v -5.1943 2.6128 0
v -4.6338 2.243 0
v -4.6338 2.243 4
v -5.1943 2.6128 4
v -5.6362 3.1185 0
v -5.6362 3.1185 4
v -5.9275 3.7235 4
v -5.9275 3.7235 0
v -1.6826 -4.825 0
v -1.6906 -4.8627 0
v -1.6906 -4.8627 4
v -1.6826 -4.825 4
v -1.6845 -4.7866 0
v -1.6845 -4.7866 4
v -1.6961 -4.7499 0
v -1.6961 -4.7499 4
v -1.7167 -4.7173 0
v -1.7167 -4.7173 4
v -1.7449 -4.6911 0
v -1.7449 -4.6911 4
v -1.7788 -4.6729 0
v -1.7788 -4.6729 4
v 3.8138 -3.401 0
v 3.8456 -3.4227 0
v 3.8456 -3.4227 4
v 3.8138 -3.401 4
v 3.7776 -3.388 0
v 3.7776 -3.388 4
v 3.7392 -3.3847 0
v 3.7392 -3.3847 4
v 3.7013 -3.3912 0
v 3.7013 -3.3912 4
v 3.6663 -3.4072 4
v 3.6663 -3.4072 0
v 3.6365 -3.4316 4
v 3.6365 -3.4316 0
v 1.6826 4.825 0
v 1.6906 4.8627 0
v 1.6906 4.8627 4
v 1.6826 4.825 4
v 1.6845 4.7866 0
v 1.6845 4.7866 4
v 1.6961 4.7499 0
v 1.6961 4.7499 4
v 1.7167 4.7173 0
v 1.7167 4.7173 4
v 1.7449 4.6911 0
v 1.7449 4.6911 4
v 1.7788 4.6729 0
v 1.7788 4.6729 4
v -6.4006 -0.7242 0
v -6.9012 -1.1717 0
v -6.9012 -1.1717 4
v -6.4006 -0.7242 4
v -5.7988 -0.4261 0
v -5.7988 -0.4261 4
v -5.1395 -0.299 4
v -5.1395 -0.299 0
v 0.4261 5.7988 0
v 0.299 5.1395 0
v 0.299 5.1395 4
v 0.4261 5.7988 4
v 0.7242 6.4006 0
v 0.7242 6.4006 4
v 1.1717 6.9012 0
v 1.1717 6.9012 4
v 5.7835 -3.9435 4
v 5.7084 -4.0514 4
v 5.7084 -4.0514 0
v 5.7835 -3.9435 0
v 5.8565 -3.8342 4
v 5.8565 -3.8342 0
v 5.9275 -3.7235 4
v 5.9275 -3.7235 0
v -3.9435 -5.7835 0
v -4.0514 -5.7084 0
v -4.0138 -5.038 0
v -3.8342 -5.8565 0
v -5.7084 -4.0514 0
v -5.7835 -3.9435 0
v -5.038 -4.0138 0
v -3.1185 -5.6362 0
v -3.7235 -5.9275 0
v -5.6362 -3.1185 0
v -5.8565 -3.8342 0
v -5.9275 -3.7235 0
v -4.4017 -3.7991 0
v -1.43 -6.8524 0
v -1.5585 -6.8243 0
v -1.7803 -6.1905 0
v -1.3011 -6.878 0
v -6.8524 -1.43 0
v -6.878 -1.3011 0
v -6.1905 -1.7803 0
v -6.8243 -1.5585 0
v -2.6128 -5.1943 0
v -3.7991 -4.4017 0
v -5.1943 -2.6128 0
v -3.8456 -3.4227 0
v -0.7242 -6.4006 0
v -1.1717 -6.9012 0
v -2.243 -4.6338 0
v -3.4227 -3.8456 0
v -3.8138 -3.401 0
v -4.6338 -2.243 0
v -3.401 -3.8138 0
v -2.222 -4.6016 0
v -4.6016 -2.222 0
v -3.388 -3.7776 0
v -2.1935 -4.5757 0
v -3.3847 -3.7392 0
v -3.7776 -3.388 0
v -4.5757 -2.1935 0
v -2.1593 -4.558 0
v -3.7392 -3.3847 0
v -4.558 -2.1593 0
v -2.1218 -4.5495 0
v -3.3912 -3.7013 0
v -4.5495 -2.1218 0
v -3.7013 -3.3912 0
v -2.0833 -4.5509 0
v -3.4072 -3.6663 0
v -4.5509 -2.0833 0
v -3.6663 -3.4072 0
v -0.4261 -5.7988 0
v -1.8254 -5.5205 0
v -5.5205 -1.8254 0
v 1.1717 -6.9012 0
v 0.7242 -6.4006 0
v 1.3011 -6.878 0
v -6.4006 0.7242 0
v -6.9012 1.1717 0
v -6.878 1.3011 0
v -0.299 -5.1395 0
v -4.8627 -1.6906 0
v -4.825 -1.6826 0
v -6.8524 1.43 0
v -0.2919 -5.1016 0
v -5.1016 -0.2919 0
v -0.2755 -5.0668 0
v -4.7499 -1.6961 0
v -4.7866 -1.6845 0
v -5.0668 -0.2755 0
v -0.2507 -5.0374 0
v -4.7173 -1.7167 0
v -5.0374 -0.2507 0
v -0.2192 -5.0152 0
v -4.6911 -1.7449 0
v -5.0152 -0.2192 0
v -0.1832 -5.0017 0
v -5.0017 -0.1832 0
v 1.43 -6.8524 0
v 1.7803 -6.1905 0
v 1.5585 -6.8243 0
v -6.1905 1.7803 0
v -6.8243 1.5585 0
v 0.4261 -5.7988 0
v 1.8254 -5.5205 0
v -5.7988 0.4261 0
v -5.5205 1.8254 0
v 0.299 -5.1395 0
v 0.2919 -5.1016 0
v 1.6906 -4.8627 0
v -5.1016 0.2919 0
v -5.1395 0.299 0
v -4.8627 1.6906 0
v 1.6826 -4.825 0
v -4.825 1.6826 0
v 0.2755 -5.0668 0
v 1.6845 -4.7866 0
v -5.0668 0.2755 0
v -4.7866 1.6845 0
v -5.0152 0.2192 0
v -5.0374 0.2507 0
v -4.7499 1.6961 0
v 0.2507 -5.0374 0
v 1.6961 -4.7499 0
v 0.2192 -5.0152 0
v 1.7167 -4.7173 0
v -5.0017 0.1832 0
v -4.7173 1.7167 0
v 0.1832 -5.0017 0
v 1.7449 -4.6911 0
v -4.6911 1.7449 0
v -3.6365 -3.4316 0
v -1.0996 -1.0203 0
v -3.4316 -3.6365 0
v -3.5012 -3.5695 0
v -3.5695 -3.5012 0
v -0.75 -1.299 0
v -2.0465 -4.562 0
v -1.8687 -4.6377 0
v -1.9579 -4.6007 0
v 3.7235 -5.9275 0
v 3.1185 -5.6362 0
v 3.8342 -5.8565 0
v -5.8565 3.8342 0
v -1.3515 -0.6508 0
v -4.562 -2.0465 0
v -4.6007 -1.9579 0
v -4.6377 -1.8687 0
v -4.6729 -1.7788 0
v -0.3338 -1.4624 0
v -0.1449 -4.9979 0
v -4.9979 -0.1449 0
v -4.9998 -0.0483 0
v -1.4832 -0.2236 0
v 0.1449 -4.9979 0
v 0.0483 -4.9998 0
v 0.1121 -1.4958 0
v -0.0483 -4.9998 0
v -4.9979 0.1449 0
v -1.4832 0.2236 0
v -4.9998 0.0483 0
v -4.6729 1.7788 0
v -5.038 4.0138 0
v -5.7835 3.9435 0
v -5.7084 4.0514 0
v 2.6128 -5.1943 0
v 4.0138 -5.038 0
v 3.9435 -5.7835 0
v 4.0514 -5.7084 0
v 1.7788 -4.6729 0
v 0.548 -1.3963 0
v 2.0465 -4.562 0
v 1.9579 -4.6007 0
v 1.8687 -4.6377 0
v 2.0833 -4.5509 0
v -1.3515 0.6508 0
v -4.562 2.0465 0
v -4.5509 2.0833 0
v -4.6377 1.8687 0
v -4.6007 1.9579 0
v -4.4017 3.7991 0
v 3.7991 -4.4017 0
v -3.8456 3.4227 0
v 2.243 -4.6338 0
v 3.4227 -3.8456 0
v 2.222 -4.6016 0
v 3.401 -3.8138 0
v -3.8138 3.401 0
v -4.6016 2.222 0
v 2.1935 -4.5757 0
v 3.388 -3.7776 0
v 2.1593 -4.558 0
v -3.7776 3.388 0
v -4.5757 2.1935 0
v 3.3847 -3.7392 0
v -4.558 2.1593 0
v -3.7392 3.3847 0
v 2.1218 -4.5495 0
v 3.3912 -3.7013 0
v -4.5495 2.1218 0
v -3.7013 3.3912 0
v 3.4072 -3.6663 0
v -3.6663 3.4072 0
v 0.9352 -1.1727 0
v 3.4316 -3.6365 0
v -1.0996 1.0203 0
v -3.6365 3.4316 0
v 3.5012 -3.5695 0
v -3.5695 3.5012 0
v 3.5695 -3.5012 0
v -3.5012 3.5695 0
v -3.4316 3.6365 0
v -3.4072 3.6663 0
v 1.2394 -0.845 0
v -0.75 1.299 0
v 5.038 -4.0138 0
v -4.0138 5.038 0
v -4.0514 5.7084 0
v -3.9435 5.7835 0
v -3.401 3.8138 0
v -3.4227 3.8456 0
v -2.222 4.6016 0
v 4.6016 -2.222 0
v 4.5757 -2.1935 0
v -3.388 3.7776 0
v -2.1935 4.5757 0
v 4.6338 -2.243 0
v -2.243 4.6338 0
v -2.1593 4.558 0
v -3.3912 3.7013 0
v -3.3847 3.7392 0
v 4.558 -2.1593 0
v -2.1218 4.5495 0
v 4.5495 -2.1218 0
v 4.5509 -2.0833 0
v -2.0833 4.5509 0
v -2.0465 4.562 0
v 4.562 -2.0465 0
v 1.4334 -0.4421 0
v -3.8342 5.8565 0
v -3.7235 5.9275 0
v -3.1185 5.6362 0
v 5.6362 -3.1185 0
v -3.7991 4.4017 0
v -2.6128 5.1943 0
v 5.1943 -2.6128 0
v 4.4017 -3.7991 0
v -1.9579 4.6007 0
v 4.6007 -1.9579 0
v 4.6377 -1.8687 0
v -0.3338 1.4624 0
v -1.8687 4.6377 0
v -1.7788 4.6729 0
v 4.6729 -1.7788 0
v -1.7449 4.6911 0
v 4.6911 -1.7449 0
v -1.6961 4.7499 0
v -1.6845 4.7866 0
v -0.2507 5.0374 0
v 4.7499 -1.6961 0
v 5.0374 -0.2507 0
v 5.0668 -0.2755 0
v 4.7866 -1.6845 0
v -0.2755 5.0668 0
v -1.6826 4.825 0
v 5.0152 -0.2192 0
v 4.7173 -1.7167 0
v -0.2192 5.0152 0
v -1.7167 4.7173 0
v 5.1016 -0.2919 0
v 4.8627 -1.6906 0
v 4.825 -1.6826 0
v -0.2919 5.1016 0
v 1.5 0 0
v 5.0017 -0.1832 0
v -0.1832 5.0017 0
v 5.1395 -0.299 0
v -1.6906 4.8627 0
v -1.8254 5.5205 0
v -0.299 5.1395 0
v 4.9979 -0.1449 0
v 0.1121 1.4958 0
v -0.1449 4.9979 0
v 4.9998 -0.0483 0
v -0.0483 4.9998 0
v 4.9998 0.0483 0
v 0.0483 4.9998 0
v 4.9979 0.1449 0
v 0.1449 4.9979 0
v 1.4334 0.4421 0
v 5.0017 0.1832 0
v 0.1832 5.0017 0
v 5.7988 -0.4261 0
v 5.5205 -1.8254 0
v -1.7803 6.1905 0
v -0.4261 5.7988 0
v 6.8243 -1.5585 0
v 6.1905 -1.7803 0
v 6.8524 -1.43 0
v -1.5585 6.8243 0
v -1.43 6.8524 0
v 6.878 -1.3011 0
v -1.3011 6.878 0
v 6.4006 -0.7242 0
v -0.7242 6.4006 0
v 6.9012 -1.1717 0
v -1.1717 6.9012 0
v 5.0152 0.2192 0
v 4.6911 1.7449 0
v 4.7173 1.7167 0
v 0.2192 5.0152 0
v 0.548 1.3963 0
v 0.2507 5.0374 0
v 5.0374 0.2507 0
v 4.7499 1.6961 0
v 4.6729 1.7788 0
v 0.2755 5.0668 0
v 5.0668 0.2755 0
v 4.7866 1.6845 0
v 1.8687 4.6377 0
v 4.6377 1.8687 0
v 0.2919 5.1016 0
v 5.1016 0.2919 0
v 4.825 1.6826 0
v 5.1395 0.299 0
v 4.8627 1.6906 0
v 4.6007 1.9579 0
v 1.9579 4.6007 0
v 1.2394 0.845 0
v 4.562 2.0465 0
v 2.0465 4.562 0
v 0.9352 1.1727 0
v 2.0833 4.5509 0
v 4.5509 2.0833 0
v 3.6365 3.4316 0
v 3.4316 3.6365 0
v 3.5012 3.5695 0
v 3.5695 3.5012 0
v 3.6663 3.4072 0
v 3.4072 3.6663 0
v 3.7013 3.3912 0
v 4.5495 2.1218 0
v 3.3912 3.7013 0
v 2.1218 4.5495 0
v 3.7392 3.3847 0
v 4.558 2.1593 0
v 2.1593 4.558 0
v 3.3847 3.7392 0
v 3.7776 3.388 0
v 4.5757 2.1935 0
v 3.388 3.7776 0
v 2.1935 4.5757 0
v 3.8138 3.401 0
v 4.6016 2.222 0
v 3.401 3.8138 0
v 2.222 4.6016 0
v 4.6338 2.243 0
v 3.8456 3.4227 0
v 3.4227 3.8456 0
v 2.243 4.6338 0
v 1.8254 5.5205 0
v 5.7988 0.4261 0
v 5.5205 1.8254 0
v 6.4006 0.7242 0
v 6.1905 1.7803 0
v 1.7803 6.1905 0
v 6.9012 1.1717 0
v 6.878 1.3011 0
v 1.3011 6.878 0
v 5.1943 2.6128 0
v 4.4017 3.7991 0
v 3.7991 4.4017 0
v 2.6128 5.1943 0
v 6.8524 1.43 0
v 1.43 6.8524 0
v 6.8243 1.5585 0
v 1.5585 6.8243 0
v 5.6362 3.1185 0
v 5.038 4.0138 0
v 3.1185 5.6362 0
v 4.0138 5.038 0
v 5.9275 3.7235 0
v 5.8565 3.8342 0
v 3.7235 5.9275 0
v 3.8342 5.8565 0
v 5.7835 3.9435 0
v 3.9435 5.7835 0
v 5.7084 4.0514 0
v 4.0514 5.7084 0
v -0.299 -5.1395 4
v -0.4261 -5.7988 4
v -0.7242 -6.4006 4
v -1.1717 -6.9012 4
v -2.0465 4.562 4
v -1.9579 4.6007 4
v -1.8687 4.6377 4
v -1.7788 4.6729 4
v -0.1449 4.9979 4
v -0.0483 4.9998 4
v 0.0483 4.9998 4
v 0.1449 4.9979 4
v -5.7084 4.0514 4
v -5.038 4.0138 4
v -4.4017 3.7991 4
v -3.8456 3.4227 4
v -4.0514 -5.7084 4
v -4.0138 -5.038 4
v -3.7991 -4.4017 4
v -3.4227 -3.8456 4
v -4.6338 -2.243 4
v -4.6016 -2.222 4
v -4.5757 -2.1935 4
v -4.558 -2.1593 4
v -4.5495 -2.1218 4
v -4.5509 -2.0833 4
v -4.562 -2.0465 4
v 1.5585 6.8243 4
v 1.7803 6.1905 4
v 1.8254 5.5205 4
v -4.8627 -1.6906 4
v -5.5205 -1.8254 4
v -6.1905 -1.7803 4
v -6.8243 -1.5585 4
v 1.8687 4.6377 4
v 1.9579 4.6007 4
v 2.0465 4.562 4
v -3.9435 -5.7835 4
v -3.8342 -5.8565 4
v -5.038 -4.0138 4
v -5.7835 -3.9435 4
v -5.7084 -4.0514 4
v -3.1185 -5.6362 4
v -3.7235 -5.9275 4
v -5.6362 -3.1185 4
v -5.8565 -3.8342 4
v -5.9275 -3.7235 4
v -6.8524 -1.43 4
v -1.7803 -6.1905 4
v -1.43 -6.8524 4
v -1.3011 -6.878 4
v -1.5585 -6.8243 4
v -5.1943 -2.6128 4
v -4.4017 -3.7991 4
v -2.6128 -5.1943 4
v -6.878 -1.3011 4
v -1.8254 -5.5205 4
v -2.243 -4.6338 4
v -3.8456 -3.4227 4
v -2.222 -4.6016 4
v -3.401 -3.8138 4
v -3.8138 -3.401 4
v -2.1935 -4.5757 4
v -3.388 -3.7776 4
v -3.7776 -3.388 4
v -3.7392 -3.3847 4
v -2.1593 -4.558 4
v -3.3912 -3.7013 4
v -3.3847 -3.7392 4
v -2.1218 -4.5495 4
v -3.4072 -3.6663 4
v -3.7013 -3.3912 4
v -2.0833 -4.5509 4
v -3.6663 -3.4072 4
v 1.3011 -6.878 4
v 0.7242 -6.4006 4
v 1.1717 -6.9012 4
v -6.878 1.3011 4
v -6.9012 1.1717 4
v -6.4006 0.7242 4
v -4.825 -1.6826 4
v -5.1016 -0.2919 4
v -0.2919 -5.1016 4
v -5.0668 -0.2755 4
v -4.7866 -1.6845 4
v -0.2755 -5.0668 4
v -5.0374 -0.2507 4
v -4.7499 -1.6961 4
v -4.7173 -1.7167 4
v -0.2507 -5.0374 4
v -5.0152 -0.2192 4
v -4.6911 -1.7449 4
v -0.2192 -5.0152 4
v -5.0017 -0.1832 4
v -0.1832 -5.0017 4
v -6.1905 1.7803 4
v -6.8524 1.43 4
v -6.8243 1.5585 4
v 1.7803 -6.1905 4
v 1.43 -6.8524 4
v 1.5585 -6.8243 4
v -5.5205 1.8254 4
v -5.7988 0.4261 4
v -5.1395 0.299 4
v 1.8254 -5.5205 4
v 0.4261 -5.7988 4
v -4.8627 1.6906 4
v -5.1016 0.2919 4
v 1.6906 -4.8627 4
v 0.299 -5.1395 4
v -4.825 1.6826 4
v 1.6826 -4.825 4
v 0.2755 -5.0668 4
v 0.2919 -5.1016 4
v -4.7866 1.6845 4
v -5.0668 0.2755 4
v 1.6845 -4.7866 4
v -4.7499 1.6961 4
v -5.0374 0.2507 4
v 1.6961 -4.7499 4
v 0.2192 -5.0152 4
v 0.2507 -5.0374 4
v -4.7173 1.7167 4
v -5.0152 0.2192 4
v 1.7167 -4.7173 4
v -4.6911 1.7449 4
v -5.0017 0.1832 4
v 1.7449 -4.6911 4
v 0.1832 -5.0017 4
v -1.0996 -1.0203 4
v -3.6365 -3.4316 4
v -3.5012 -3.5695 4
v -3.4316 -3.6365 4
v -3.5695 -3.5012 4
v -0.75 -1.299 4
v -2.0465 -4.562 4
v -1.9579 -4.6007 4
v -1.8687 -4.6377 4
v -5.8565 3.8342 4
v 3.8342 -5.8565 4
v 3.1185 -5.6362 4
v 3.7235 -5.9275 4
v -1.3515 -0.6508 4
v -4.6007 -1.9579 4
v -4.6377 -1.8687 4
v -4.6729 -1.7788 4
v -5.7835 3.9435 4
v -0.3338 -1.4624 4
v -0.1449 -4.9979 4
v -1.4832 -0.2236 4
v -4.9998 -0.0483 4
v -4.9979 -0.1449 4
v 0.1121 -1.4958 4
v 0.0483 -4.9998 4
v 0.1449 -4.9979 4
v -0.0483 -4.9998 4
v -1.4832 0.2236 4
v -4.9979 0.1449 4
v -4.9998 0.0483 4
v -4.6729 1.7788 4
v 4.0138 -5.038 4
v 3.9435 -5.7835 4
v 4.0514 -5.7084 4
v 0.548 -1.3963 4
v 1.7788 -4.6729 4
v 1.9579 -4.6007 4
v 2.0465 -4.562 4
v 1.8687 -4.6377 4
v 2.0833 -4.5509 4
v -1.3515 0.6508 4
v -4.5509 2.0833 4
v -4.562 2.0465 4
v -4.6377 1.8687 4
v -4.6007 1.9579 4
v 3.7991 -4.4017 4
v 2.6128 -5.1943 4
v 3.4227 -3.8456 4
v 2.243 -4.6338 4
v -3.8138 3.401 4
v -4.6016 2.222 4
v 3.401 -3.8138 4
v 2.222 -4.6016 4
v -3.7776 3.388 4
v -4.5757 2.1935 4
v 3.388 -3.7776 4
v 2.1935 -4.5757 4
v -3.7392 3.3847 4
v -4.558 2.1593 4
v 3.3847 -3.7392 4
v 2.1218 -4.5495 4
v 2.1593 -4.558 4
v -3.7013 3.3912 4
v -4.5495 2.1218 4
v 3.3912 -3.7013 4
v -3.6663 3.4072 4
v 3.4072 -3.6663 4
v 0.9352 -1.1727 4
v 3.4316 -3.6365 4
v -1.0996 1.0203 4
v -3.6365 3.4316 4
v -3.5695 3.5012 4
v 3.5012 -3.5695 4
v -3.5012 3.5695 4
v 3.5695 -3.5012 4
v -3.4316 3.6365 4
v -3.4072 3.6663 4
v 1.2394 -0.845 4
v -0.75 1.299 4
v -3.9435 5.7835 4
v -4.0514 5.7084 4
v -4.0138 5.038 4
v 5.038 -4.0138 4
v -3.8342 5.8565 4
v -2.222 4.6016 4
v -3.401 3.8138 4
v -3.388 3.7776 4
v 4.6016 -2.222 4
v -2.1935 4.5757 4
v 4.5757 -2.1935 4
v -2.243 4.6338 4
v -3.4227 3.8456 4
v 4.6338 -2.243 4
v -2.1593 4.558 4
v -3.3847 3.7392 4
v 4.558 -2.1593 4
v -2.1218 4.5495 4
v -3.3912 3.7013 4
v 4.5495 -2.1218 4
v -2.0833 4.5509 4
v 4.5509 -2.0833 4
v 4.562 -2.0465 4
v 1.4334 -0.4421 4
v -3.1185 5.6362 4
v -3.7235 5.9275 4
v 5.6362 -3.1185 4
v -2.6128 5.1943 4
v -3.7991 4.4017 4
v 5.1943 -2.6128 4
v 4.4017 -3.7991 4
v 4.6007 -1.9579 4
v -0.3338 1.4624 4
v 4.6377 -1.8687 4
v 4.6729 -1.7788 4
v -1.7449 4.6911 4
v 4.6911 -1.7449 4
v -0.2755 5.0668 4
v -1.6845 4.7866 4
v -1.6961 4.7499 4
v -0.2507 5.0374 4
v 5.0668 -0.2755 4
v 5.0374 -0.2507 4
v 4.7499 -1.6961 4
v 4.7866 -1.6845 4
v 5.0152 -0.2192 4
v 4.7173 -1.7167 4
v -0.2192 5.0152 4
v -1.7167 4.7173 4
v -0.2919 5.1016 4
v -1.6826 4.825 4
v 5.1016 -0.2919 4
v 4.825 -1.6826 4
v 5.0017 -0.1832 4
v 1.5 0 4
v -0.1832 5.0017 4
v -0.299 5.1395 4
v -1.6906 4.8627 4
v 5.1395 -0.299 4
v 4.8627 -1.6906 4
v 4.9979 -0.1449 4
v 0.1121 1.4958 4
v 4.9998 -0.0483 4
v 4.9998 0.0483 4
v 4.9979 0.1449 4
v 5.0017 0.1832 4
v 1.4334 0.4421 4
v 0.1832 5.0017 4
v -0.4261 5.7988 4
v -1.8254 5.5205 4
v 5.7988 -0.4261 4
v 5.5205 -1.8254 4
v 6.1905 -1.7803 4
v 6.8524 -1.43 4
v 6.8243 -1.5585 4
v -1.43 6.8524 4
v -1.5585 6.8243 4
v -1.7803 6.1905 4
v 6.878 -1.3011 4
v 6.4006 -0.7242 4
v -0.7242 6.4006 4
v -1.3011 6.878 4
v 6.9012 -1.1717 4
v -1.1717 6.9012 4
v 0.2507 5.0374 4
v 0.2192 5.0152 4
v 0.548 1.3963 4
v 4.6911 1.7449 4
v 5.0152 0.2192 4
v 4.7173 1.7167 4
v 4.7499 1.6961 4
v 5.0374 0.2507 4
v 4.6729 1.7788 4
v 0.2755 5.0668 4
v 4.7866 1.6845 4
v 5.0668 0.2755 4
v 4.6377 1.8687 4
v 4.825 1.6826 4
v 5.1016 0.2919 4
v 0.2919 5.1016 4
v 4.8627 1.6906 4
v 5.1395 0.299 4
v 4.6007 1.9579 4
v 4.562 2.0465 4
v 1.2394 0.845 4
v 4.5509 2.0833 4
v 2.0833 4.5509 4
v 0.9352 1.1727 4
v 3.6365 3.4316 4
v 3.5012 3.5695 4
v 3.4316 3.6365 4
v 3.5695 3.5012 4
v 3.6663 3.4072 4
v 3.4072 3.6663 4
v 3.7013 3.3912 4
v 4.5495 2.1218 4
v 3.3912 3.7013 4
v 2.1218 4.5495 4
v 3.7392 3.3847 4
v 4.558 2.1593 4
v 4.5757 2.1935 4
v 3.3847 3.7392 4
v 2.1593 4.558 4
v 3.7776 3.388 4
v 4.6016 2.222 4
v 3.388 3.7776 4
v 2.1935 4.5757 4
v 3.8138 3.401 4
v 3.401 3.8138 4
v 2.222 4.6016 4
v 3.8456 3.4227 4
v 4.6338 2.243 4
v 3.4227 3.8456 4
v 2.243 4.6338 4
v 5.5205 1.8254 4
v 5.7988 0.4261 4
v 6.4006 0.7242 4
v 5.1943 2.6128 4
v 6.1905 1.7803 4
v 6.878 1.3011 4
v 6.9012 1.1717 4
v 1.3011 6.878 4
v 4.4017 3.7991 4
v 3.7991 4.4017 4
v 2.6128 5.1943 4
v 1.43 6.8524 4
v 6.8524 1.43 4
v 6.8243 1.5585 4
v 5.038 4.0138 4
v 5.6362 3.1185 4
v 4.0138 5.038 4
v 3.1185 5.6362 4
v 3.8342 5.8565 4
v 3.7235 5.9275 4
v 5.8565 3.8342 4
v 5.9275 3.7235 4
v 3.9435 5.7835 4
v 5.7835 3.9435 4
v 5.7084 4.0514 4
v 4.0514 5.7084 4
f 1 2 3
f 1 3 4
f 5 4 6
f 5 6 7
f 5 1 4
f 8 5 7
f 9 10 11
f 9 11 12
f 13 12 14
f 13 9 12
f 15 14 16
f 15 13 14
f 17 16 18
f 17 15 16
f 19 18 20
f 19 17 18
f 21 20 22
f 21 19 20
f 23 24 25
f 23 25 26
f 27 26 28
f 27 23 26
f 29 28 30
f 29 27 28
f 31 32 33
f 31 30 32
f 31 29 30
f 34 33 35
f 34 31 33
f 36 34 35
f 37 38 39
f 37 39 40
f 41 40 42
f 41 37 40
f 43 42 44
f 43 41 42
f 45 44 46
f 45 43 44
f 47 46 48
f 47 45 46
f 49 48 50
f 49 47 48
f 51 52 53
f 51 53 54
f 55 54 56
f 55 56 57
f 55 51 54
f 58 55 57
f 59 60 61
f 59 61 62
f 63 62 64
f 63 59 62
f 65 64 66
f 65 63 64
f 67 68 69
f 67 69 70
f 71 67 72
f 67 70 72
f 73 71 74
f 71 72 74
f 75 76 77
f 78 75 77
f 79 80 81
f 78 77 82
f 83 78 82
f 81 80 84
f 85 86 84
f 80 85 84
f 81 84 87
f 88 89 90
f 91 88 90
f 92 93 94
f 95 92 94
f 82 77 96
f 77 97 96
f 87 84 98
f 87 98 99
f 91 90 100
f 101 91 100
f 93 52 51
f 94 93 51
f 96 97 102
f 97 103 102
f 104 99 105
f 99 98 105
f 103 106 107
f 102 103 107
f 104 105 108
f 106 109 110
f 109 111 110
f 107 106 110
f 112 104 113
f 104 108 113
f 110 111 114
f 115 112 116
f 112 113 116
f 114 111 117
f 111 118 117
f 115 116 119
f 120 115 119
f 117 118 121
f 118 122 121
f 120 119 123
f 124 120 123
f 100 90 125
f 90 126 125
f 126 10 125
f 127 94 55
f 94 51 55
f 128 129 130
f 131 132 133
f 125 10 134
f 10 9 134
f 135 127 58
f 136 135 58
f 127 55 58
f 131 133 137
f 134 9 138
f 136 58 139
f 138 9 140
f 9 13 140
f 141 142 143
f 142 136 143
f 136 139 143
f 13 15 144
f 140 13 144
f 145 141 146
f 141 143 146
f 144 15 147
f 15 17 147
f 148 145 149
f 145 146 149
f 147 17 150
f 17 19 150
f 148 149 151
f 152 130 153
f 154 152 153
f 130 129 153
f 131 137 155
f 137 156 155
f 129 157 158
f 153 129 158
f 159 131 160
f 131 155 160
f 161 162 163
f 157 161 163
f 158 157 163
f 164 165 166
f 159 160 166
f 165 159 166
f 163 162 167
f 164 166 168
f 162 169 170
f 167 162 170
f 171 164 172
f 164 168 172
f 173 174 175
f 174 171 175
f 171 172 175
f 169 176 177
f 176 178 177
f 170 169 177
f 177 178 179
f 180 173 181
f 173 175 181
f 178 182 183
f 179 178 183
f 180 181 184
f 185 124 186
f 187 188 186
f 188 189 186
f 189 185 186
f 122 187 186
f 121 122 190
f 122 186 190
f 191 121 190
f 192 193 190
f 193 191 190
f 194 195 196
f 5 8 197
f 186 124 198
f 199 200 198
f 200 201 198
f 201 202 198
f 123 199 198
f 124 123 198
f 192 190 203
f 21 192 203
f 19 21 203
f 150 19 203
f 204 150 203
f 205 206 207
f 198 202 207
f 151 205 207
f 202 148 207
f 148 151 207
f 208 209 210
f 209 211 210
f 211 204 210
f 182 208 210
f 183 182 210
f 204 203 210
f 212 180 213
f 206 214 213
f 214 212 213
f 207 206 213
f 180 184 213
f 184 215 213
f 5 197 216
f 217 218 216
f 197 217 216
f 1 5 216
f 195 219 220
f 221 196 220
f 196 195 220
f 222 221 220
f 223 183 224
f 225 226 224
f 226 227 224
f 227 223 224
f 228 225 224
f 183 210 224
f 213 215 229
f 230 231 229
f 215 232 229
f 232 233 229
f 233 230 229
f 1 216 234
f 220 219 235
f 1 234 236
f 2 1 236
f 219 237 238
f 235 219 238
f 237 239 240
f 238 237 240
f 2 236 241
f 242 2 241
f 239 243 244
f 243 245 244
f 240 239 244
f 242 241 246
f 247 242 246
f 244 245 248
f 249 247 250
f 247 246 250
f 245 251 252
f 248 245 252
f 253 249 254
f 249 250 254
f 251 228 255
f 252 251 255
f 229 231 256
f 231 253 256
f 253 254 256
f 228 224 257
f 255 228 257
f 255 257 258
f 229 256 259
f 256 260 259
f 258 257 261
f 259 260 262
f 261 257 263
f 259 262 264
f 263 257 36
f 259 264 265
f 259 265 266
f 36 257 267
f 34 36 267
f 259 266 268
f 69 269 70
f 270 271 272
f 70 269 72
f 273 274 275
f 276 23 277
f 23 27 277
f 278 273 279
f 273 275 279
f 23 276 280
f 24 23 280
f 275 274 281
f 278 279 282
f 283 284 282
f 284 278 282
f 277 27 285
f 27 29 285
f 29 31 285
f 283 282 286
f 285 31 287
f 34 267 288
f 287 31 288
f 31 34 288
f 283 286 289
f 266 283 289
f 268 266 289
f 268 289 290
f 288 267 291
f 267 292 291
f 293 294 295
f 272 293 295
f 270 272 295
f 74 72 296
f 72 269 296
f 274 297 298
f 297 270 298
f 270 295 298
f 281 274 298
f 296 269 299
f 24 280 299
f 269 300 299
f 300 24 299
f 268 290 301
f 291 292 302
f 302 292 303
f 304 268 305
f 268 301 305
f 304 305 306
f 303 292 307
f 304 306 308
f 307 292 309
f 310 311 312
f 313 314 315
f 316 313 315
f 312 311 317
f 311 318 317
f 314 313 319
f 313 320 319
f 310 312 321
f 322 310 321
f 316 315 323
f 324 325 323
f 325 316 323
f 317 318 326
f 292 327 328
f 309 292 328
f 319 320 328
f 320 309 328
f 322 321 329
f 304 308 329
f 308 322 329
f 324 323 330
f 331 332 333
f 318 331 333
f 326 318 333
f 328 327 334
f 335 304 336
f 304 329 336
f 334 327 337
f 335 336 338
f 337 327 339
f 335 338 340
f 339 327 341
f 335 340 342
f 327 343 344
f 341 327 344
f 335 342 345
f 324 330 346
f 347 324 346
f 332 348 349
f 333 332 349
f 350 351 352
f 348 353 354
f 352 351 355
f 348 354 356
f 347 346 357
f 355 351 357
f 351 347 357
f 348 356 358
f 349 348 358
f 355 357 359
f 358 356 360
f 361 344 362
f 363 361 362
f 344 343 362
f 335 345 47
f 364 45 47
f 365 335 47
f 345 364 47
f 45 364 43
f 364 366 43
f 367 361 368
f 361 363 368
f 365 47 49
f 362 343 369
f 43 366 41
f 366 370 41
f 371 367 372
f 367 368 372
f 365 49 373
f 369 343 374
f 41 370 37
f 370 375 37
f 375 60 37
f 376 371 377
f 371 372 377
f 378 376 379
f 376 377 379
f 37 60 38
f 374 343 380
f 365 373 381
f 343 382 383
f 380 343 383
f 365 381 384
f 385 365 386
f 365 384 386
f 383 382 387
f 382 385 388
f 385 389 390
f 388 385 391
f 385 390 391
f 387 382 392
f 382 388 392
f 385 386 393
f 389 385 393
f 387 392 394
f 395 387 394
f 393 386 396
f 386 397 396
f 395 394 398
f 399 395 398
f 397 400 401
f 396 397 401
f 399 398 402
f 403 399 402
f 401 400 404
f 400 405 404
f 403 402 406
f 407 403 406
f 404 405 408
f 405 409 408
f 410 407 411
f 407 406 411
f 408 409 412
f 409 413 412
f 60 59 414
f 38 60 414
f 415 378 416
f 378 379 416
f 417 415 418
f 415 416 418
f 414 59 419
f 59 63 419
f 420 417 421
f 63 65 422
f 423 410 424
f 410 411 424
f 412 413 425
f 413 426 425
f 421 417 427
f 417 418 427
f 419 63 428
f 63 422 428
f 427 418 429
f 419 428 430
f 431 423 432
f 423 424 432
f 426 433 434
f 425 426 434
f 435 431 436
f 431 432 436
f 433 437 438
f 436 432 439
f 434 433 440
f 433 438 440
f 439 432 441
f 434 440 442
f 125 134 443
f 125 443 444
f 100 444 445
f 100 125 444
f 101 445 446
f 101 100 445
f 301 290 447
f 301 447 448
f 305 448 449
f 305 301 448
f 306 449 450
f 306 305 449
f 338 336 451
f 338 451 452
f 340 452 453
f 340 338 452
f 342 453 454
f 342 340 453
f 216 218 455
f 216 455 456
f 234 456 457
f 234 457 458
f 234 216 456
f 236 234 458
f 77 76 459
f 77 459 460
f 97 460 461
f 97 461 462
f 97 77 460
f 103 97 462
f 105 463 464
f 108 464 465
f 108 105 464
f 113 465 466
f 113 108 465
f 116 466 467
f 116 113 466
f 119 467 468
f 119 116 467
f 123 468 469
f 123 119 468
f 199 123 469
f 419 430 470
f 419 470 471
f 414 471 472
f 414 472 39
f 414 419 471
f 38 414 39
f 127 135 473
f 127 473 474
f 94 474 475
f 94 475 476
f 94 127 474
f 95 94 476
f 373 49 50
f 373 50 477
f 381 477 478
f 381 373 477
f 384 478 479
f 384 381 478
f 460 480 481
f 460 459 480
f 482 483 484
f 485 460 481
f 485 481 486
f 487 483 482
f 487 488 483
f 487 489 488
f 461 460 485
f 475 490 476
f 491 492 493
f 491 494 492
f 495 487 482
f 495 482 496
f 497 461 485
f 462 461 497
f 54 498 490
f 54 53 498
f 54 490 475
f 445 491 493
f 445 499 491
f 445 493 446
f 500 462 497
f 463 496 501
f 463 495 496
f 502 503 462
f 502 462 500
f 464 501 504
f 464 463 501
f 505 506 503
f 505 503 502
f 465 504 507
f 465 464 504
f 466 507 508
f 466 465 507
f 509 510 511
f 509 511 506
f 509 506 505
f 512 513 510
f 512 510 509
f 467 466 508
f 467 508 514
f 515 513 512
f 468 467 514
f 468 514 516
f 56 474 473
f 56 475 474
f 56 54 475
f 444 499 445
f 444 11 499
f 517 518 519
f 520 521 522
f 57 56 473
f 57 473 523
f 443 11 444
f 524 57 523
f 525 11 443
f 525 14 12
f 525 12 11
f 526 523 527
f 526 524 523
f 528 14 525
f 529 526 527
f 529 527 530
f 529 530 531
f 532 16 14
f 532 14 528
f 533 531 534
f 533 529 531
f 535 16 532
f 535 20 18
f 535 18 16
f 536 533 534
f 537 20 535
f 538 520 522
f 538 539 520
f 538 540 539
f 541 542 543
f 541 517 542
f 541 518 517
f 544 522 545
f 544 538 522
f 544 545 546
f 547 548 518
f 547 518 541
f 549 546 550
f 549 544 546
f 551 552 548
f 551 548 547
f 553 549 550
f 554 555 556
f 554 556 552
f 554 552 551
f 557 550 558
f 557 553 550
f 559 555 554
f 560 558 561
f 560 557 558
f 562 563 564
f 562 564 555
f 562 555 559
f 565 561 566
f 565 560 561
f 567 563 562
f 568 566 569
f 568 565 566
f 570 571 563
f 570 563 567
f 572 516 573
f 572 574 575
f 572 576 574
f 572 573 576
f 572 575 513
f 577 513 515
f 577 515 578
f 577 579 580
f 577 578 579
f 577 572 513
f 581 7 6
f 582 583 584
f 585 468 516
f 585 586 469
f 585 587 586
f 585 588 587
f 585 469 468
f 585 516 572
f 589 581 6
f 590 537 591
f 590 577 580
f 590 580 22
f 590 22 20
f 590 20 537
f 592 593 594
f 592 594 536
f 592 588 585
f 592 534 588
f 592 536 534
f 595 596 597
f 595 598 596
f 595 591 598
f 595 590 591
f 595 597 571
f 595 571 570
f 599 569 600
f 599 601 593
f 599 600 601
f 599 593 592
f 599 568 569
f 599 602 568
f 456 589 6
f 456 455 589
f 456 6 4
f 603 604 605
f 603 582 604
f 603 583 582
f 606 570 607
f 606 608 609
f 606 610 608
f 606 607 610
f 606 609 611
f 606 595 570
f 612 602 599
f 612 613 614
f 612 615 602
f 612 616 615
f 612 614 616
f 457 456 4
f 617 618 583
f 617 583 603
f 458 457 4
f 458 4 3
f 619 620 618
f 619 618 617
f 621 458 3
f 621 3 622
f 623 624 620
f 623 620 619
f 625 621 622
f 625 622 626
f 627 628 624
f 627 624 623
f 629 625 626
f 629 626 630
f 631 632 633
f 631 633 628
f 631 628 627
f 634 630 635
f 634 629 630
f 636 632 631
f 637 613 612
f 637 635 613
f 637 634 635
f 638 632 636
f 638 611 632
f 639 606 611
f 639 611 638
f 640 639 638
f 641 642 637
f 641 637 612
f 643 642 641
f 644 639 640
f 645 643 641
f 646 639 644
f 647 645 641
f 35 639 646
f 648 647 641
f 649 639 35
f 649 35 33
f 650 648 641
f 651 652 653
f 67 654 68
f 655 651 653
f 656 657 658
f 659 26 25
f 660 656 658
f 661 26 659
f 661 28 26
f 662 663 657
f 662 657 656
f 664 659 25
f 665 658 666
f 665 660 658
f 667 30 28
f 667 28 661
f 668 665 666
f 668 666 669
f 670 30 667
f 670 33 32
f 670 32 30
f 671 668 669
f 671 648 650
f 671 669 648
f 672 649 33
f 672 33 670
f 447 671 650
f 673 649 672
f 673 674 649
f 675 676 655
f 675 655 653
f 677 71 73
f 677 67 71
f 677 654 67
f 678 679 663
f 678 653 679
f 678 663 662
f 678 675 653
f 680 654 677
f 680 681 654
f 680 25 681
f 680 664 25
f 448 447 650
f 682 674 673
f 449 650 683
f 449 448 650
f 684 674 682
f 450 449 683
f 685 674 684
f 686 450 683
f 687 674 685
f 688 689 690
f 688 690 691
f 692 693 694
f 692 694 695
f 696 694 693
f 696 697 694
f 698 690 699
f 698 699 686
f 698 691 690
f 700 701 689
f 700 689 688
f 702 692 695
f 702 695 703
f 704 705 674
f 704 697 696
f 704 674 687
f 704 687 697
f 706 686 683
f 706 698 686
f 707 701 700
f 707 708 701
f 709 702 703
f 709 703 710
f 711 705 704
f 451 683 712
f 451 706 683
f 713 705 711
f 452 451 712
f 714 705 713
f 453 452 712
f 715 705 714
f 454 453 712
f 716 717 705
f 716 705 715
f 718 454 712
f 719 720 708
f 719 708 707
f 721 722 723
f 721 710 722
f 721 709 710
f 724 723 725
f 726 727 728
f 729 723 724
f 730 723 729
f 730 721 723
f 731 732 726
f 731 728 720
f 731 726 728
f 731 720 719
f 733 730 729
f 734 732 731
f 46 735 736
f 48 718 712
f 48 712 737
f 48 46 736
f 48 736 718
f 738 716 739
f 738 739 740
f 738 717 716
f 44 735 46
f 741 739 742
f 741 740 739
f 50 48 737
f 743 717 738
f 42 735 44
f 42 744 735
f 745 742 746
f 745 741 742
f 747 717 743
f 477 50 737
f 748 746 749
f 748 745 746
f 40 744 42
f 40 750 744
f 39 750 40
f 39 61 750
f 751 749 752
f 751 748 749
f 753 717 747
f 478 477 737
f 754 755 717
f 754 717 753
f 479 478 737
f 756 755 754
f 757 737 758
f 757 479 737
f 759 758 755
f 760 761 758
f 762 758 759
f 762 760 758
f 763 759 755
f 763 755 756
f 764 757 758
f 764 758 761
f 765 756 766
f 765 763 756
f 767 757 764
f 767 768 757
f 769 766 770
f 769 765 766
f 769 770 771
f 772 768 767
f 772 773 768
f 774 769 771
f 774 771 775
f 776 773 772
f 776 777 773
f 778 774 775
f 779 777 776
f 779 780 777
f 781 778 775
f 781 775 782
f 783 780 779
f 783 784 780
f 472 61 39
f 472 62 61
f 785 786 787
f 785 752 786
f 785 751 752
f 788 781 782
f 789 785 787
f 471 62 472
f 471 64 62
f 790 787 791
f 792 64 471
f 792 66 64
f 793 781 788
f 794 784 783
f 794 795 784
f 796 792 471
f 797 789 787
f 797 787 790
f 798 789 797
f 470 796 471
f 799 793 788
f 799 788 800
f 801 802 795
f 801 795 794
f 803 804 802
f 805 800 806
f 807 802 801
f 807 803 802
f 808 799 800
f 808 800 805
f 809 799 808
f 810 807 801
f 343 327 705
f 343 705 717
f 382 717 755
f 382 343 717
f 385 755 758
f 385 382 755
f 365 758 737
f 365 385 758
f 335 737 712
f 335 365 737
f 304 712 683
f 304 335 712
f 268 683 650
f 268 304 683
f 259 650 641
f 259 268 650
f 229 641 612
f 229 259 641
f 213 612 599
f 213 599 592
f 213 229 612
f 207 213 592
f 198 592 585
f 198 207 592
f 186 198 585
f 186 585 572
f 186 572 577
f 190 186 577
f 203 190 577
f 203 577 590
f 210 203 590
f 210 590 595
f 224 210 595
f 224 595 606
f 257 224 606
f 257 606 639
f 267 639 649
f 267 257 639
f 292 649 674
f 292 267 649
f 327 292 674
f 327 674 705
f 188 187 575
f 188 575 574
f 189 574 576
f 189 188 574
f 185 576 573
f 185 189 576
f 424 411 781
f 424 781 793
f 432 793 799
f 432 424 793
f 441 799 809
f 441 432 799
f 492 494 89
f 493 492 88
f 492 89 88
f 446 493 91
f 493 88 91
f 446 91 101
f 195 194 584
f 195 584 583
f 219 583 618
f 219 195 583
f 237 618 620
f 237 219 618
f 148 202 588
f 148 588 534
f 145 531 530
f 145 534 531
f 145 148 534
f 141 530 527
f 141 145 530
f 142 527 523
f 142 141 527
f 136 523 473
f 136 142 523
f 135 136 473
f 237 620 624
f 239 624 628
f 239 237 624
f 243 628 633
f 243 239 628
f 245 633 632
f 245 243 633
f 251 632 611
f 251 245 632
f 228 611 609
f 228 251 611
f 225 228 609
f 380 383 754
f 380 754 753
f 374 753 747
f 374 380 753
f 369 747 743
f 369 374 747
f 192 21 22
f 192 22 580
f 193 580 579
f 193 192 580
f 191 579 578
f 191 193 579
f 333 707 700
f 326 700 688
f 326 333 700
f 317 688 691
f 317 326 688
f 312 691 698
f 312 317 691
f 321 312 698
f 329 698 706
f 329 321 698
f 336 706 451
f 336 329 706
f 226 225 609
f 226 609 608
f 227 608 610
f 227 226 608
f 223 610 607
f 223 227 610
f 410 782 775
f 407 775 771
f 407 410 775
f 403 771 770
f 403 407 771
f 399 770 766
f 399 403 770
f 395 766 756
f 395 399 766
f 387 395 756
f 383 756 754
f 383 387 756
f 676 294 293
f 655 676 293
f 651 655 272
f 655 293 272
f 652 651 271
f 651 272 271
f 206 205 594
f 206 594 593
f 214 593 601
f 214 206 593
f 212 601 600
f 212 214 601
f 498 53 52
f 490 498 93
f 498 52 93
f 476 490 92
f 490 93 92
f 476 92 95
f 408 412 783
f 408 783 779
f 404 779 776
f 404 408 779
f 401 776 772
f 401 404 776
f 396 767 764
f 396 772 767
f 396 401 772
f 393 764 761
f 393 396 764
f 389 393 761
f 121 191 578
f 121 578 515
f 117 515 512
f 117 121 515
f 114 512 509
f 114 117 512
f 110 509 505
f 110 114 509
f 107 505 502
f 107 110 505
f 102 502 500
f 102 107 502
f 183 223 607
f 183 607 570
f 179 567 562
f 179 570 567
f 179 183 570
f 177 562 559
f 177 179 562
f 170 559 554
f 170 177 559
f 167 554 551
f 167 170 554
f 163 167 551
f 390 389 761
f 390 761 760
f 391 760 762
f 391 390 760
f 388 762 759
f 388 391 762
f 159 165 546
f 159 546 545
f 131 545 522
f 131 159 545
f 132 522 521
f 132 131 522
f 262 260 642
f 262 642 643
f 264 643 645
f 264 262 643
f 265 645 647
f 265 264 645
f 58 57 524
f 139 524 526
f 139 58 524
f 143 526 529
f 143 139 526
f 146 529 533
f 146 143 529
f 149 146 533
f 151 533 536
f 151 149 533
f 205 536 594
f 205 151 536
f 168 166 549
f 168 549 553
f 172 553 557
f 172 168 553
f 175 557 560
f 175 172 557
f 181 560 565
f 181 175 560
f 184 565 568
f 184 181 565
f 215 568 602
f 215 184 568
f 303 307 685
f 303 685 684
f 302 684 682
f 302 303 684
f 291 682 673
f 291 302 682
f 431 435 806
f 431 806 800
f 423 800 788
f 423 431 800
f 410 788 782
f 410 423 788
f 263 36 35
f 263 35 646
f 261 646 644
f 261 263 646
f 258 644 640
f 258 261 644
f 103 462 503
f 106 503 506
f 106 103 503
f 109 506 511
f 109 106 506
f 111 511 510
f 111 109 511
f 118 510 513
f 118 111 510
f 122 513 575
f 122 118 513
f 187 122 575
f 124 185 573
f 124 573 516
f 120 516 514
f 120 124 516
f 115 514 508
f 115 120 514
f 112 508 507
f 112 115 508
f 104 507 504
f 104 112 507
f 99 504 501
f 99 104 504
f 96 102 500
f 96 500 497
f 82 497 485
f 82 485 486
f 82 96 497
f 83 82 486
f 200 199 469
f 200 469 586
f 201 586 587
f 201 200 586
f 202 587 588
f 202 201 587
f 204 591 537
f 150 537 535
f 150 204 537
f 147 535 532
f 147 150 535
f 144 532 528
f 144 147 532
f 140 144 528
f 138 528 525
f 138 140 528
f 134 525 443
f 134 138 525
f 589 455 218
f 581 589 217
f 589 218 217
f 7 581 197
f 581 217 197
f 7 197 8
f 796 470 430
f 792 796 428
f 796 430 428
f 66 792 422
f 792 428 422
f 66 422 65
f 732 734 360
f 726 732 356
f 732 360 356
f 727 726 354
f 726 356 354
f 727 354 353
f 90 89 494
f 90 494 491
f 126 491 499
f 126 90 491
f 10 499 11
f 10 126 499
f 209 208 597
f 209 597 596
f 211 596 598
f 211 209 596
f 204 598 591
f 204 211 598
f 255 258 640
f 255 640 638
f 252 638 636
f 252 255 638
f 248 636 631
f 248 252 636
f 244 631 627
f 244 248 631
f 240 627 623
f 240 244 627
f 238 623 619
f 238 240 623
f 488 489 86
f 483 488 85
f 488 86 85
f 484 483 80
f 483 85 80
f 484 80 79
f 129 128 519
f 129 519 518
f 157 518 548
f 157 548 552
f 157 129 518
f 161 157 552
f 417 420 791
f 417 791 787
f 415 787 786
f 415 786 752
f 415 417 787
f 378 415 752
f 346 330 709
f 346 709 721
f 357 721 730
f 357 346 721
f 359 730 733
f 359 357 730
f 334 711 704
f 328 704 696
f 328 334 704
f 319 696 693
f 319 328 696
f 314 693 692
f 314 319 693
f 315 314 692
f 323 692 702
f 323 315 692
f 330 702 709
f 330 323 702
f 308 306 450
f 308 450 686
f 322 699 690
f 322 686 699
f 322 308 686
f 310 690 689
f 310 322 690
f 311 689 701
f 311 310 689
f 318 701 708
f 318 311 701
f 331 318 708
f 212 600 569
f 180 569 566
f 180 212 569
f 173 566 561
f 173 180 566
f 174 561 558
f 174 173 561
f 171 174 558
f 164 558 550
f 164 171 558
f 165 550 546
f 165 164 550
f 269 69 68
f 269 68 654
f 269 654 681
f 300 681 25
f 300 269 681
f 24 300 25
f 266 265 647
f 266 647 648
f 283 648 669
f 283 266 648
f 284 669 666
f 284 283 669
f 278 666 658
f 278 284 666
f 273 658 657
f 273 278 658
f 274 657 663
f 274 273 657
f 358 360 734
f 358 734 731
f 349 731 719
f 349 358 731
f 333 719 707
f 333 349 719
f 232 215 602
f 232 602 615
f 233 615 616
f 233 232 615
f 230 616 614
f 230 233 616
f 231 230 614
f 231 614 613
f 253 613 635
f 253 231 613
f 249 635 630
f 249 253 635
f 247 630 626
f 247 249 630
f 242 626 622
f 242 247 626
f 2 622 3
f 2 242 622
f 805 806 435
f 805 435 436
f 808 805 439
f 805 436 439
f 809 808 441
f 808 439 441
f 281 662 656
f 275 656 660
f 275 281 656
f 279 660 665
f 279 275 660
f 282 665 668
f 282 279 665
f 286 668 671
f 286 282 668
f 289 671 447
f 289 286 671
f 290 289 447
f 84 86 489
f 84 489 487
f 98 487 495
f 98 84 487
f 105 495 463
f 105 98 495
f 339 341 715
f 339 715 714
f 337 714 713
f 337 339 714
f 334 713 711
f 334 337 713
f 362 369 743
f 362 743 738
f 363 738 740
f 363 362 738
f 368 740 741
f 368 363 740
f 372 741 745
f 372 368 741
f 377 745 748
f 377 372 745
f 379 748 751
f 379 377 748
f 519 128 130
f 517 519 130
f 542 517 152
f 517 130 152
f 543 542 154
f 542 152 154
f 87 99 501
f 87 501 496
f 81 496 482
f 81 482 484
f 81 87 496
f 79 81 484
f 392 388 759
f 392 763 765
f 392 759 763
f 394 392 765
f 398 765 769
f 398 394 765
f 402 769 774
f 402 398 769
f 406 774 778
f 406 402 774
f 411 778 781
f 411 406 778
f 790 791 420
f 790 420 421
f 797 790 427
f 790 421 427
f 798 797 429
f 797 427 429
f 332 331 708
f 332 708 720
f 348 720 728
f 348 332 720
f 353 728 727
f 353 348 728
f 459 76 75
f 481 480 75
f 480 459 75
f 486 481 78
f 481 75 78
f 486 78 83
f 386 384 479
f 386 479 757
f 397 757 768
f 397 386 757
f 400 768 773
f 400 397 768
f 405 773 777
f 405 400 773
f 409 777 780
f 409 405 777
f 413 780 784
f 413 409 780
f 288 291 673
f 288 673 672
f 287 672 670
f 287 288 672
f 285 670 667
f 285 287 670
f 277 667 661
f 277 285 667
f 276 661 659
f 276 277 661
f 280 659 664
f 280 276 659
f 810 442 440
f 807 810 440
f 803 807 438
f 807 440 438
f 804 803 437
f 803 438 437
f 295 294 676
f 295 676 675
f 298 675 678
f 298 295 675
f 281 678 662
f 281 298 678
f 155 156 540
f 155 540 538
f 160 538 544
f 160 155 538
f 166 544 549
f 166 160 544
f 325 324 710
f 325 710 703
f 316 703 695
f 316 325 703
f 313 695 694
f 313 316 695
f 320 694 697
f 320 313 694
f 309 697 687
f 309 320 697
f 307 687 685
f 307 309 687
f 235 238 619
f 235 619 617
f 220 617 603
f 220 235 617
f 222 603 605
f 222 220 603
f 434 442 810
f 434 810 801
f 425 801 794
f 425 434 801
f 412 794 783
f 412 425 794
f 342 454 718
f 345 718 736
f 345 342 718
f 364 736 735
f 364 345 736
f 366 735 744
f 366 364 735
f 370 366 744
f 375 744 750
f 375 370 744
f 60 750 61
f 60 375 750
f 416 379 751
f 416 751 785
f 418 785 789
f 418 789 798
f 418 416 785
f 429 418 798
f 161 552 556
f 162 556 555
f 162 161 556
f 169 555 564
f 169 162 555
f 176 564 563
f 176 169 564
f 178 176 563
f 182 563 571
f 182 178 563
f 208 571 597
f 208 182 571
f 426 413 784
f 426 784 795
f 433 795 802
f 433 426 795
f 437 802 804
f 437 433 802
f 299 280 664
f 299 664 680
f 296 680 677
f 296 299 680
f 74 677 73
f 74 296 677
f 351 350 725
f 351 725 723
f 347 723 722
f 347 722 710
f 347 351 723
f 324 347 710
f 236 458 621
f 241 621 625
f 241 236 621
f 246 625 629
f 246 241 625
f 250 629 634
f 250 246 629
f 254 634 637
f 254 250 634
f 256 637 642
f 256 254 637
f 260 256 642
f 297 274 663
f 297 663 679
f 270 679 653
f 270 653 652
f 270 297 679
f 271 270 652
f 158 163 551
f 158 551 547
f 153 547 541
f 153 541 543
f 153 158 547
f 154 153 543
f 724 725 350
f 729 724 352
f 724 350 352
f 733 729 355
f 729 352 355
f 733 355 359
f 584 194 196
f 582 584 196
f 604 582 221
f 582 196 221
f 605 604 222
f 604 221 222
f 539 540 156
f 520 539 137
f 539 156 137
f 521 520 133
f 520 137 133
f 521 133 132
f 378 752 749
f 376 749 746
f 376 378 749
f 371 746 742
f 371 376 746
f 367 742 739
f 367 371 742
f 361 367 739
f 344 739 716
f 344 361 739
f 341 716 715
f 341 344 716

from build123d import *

# Parameters (mm, degrees)
SKETCH1_R           = 7
SKETCH1_R_2         = 1.5
BOSS_EXTRUDE1_DEPTH = 4
CUT_EXTRUDE2_DEPTH  = 5
CIRPATTERN2_COUNT   = 16


with BuildPart() as part:
    # Sketch1 → Boss-Extrude1 (new body)
    with BuildSketch(Plane.XY):
        Circle(SKETCH1_R)
        Circle(SKETCH1_R_2, mode=Mode.SUBTRACT)
    extrude(amount=BOSS_EXTRUDE1_DEPTH)

    # Sketch4 → Cut-Extrude2 (cut, through all)
    with BuildSketch(Plane.XY):
        with BuildLine():
            ThreePointArc((-0.144865992, 4.997900944), (0, 5), (0.144865992, 4.997900944))
            ThreePointArc((0.144865992, 4.997900944), (0.250687134, 5.037371727), (0.298978368, 5.139469785))
            ThreePointArc((0.298978368, 5.139469785), (0.554893378, 6.109748451), (1.171724109, 6.90123631))
            ThreePointArc((1.171724109, 6.90123631), (0, 7), (-1.171724109, 6.90123631))
            ThreePointArc((-1.171724109, 6.90123631), (-0.554893378, 6.109748451), (-0.298978368, 5.139469785))
            ThreePointArc((-0.298978368, 5.139469785), (-0.250687134, 5.037371727), (-0.144865992, 4.997900944))
        make_face()
    cut_extrude2 = extrude(amount=CUT_EXTRUDE2_DEPTH, mode=Mode.SUBTRACT)

    # CirPattern2: Cut-Extrude2 ×16 about axis
    cirpattern2_axis = Axis((0, 0, 0), (0, 0, 1))
    for i in range(1, CIRPATTERN2_COUNT):
        add(cut_extrude2.rotate(cirpattern2_axis, i * 360 / CIRPATTERN2_COUNT), mode=Mode.SUBTRACT)


solid = part.part
